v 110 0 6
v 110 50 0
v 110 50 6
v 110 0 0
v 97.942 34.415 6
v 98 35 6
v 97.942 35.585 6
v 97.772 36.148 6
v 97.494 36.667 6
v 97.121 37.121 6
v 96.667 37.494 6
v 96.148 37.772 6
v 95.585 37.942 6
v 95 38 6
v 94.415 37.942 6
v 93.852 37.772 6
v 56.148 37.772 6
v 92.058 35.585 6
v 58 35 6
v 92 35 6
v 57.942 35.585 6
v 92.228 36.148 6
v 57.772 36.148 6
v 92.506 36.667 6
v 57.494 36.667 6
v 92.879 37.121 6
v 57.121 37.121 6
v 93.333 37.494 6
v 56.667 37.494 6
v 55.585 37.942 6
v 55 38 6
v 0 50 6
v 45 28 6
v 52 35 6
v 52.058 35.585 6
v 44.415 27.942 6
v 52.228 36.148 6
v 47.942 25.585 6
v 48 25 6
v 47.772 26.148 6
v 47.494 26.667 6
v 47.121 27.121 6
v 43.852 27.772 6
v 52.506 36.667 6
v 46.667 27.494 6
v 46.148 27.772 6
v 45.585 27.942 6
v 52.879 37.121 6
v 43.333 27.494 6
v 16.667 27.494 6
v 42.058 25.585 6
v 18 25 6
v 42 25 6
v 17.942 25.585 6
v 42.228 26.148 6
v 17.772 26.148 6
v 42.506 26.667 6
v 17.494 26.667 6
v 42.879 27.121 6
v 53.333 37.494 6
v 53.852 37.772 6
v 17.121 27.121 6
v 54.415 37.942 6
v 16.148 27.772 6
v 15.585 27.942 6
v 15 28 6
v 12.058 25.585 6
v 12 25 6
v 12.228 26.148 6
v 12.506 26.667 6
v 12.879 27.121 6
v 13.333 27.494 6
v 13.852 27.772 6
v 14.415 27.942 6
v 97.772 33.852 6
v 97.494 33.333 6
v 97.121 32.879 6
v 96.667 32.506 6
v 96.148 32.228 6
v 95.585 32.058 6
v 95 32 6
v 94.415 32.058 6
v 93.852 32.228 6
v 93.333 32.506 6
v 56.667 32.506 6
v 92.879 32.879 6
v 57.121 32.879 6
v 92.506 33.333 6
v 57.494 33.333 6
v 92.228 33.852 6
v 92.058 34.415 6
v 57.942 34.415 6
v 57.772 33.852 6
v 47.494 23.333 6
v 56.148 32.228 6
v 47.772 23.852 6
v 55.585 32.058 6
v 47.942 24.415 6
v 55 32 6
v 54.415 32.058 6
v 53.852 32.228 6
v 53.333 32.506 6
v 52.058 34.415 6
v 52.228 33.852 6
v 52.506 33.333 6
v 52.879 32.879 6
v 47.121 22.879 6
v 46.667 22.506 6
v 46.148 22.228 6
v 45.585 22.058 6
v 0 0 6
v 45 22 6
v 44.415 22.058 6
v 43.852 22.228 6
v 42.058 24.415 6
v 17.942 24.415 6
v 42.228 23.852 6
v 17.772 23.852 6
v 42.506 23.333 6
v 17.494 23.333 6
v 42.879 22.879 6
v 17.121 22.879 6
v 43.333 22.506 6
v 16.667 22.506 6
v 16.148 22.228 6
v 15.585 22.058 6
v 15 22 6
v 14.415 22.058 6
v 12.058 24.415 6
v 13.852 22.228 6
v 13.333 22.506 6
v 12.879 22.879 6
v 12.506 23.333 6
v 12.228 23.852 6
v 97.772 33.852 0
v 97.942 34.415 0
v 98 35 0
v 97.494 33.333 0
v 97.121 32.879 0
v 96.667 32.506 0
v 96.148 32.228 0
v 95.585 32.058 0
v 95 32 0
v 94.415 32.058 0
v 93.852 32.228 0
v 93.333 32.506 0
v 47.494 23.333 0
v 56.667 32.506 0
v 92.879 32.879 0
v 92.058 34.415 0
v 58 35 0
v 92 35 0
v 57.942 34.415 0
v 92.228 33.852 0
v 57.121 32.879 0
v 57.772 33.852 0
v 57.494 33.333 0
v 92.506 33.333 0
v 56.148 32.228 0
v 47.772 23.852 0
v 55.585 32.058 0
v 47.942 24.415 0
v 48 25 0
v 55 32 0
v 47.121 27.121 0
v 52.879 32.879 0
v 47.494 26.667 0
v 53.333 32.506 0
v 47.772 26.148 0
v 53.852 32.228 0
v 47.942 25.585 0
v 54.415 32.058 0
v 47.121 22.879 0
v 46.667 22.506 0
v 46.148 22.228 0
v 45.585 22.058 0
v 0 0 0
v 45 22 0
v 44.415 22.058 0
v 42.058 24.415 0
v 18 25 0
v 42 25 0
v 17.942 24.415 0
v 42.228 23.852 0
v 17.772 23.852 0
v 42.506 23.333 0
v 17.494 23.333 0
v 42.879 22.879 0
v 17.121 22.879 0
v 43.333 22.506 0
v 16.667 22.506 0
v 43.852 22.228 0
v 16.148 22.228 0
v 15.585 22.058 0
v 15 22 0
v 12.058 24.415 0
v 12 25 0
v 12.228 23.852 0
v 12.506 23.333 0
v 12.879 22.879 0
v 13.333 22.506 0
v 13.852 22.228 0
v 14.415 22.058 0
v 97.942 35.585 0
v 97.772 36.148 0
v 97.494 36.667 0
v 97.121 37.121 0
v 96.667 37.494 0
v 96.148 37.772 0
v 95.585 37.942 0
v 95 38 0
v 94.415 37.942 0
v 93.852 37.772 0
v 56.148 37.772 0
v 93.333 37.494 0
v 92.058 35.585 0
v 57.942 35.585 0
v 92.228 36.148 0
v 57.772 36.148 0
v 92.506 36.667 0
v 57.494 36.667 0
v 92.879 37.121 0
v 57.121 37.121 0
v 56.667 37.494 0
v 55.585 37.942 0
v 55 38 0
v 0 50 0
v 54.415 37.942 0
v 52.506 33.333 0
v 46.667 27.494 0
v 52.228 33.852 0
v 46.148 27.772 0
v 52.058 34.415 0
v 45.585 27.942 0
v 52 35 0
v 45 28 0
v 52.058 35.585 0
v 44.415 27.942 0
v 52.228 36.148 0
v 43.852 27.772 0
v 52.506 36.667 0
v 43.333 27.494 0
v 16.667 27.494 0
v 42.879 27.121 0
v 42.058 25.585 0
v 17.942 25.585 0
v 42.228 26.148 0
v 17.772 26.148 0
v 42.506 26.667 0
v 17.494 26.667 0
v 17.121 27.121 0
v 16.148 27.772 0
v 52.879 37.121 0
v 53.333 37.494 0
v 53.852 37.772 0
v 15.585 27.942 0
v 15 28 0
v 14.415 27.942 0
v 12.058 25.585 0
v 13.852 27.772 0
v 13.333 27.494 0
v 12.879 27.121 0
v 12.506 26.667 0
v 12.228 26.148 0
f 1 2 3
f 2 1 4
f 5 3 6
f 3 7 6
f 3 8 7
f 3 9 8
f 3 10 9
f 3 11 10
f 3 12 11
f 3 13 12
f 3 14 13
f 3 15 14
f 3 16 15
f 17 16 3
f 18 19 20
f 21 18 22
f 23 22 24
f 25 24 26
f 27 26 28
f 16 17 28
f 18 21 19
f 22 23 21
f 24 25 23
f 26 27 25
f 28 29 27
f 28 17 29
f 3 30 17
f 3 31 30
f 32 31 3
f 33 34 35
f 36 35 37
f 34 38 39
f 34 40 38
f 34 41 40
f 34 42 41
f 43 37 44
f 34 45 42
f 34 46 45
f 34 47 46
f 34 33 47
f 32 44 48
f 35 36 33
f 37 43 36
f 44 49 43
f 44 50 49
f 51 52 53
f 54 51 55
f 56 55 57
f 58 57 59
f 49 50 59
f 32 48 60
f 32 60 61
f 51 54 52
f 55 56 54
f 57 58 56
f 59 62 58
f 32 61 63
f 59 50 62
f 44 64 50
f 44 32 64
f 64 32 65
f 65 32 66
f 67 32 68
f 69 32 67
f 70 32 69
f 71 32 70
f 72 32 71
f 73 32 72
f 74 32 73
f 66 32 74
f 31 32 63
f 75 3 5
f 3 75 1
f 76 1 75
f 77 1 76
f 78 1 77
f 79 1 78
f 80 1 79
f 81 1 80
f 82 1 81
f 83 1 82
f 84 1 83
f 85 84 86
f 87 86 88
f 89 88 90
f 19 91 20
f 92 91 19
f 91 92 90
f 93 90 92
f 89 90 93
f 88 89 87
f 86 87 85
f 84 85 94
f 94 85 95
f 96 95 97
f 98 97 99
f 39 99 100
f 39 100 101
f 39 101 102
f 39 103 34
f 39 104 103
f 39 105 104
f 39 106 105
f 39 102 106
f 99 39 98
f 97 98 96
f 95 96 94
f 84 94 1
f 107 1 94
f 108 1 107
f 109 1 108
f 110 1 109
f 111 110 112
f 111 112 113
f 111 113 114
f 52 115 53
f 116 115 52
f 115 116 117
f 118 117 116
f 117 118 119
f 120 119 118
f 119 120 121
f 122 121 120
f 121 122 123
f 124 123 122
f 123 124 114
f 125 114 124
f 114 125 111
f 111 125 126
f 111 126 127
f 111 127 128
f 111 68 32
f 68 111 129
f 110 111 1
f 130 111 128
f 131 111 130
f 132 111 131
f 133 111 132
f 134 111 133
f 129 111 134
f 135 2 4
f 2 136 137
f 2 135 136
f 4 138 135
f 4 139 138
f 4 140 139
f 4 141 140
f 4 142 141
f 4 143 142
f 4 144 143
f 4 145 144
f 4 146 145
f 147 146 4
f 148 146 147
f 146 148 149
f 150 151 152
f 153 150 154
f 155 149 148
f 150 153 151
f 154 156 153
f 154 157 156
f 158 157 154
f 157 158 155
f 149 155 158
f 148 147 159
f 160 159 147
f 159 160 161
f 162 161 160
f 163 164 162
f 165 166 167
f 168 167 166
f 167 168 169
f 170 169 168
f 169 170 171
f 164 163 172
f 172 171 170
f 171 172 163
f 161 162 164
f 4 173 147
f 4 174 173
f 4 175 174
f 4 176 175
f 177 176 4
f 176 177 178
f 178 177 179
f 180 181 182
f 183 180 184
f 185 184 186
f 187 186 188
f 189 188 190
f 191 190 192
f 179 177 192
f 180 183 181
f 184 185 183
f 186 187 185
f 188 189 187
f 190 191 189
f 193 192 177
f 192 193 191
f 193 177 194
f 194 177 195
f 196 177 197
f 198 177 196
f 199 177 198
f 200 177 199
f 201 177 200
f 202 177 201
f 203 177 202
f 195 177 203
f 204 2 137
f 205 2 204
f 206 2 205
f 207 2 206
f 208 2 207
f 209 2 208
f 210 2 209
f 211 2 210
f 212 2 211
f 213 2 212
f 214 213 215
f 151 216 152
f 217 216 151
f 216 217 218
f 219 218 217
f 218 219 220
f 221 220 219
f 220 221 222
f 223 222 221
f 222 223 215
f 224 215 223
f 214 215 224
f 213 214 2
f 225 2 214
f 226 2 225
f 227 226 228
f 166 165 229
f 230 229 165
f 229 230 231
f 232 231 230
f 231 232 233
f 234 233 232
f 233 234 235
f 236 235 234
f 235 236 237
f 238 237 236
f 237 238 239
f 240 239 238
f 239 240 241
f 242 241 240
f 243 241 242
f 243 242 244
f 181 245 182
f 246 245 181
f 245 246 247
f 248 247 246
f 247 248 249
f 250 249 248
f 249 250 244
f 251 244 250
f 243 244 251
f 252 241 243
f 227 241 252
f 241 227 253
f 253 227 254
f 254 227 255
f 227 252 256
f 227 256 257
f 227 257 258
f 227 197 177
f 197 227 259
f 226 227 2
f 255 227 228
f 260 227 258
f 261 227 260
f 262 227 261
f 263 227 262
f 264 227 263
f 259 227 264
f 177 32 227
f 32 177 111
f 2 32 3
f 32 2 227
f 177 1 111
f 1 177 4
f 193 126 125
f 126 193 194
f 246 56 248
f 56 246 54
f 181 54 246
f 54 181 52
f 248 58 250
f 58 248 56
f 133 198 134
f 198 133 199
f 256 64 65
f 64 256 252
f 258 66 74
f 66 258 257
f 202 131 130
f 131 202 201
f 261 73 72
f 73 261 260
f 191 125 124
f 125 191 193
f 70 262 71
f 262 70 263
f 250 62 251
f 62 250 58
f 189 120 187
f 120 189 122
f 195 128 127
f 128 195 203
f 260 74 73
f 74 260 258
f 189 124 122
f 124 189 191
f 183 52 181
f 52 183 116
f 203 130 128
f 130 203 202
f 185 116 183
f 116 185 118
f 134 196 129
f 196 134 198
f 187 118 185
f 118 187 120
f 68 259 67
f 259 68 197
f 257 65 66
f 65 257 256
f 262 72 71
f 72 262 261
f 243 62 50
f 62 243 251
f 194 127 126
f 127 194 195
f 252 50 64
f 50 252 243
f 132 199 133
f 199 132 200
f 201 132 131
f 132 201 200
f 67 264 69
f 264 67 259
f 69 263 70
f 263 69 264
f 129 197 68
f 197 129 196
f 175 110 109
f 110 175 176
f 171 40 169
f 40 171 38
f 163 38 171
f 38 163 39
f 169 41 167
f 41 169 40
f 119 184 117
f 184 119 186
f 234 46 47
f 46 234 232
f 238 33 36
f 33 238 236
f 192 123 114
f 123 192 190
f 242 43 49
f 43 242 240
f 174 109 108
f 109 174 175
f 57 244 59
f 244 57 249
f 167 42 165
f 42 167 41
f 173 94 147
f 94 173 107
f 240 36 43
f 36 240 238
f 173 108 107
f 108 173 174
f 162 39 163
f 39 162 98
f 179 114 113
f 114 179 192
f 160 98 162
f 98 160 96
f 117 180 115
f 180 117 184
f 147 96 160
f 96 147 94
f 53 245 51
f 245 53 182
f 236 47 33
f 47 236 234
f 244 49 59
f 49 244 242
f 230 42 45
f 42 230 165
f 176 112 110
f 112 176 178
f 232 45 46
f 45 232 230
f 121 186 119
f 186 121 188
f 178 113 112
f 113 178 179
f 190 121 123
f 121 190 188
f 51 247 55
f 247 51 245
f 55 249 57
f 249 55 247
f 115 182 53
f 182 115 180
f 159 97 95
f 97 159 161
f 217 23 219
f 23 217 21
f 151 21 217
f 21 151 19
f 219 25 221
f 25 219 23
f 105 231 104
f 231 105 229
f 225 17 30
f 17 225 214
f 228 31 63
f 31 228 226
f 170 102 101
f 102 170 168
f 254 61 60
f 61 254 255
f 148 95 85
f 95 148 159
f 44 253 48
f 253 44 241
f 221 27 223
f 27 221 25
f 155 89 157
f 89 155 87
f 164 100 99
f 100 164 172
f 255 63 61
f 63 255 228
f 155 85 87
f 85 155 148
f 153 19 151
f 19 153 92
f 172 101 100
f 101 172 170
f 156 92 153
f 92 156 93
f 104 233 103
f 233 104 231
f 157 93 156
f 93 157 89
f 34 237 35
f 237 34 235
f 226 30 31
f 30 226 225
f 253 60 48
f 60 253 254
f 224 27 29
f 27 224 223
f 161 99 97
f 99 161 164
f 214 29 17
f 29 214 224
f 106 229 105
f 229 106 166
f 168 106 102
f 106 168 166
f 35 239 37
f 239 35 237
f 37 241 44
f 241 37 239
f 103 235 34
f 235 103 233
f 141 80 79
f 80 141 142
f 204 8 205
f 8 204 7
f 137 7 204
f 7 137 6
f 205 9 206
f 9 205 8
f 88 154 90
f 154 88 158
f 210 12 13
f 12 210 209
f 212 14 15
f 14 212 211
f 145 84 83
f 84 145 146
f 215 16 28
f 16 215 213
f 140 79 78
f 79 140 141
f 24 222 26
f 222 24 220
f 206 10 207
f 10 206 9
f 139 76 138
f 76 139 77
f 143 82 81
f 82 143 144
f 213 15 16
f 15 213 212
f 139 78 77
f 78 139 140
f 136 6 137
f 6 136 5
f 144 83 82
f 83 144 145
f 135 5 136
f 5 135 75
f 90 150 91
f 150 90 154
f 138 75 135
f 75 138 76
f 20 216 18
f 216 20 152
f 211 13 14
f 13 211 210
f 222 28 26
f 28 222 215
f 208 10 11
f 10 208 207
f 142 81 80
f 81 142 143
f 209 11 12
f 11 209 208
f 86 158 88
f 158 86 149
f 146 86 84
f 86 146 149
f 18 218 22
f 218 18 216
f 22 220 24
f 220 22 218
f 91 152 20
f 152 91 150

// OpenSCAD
$fn = 32;

// ----------------------------------------------------------------------
// Hole field: plate with holes at given coordinates
// ----------------------------------------------------------------------

// --- parameters (mm) ---
plate_l = 110;            // plate length, X
plate_w = 50;             // plate width, Y
plate_t = 6;              // plate thickness, Z
hole_d = 6;               // hole diameter

difference() {
  cube([plate_l, plate_w, plate_t]);
  translate([15, 25, -1]) cylinder(h = plate_t + 2, d = hole_d);
  translate([45, 25, -1]) cylinder(h = plate_t + 2, d = hole_d);
  translate([55, 35, -1]) cylinder(h = plate_t + 2, d = hole_d);
  translate([95, 35, -1]) cylinder(h = plate_t + 2, d = hole_d);
}
